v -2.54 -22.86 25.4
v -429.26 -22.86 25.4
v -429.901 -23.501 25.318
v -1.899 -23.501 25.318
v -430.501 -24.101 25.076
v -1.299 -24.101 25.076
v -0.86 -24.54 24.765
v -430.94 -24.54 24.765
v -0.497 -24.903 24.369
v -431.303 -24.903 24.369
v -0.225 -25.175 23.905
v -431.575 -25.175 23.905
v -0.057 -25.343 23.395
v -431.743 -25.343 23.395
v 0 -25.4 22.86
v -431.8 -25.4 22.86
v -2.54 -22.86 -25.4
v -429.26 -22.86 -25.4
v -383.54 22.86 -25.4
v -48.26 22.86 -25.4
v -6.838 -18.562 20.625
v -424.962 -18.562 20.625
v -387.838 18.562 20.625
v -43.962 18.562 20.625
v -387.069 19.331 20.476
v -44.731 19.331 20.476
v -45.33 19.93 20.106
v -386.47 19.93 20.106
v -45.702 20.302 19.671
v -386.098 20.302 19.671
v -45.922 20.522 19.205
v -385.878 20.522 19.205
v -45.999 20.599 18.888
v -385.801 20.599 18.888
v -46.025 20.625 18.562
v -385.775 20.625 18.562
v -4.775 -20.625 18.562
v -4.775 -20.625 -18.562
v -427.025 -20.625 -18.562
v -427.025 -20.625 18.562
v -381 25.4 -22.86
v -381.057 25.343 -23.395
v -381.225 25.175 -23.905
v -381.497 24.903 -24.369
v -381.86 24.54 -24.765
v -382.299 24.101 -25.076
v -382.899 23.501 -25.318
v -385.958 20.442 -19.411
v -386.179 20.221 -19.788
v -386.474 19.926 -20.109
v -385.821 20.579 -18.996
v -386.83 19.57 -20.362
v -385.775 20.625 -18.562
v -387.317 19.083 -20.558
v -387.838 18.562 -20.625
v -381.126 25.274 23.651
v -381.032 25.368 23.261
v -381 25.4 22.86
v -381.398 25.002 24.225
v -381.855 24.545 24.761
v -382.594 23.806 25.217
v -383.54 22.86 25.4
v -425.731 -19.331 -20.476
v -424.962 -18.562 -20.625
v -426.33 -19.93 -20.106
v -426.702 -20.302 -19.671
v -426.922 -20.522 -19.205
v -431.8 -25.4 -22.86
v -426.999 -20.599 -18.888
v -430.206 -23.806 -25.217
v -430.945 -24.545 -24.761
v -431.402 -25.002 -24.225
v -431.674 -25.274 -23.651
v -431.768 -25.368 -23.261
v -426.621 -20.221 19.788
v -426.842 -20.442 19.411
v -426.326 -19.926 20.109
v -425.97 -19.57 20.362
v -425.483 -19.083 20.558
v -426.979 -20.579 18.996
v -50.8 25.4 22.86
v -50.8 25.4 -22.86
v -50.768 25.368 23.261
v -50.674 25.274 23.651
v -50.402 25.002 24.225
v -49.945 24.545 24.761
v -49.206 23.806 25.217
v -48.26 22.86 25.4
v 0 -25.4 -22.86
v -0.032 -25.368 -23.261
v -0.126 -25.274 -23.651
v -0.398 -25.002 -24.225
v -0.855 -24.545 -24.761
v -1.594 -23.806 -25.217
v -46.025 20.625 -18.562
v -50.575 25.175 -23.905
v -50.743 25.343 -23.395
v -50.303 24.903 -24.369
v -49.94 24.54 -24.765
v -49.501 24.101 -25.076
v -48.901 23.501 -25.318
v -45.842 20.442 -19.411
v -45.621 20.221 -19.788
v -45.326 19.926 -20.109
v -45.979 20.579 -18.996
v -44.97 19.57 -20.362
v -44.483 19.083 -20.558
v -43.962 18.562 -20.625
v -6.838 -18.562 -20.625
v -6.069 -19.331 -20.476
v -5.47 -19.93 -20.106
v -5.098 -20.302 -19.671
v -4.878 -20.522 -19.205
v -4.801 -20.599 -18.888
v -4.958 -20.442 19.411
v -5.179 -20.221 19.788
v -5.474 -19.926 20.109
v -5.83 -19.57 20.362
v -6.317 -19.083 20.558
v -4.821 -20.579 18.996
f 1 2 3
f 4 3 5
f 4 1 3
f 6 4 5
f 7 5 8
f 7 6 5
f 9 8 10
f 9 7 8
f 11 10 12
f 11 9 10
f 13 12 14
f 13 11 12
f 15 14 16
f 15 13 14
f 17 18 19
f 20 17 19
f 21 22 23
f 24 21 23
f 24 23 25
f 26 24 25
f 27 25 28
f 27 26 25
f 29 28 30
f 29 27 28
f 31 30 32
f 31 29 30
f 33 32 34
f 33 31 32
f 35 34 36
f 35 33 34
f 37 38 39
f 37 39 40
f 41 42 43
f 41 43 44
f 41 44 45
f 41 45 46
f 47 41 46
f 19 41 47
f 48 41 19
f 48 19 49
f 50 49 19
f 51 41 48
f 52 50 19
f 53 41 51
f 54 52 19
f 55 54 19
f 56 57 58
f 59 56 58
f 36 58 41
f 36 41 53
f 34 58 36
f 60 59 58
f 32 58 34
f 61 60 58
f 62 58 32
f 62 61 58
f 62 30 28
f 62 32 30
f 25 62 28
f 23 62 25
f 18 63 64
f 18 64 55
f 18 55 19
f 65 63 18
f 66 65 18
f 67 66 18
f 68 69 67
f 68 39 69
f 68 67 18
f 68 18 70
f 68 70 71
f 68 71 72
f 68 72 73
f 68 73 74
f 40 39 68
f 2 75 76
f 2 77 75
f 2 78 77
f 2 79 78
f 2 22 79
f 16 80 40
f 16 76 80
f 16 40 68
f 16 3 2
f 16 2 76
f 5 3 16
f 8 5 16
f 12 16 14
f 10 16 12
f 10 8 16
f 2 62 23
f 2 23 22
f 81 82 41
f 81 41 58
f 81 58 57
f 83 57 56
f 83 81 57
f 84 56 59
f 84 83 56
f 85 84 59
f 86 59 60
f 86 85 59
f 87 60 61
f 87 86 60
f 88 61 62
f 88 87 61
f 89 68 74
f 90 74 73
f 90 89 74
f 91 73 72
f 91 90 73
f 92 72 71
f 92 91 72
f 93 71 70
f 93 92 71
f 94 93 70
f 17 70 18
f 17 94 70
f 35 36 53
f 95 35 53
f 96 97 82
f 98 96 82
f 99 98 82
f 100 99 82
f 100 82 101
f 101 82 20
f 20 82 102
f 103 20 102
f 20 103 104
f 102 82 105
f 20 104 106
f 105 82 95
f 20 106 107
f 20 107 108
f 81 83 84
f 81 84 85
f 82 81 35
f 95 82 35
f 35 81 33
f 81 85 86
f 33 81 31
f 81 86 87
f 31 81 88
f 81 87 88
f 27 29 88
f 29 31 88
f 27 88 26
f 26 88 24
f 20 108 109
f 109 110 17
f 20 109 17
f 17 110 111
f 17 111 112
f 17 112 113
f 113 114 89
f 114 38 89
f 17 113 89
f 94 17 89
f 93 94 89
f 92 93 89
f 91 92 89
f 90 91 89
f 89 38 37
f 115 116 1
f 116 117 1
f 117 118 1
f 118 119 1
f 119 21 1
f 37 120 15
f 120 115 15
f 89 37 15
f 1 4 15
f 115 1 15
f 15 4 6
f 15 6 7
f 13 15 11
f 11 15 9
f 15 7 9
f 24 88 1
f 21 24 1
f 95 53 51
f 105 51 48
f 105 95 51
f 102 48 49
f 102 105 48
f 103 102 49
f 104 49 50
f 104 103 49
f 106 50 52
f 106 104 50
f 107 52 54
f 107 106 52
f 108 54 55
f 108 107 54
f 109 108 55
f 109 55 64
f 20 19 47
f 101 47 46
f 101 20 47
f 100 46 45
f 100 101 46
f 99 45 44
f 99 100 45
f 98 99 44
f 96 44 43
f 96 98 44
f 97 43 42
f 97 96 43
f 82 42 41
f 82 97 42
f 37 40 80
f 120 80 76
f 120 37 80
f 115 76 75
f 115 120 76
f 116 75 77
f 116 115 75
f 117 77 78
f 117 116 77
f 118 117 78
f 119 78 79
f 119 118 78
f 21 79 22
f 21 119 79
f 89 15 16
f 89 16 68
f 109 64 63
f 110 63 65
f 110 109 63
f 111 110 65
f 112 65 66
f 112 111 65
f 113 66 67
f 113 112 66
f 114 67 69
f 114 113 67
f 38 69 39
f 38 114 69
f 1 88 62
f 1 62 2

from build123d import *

# Parameters (mm, degrees)
SQUARE_TUBE_2X2X188_A500_1_DEPTH = 431.8
CUT_EXTRUDE1_DEPTH               = 436.519276267


with BuildPart() as part:
    # Sketch12 → Square tube 2X2X188 A500(1) (new body)
    with BuildSketch(Plane(origin=(0, 0, 0), x_dir=(0, -1, 0), z_dir=(-1, 0, 0))):
        with BuildLine():
            Line((22.86, -25.4), (-22.86, -25.4))
            ThreePointArc((-22.86, -25.4), (-24.656051224, -24.656051224), (-25.4, -22.86))
            Line((-25.4, -22.86), (-25.4, 22.86))
            ThreePointArc((-25.4, 22.86), (-24.656051224, 24.656051224), (-22.86, 25.4))
            Line((-22.86, 25.4), (22.86, 25.4))
            ThreePointArc((22.86, 25.4), (24.656051224, 24.656051224), (25.4, 22.86))
            Line((25.4, 22.86), (25.4, -22.86))
            ThreePointArc((25.4, -22.86), (24.656051224, -24.656051224), (22.86, -25.4))
        make_face()
        with BuildLine():
            Line((18.56232, 20.6248), (-18.56232, 20.6248))
            ThreePointArc((-18.56232, 20.6248), (-20.020713594, 20.020713594), (-20.6248, 18.56232))
            Line((-20.6248, 18.56232), (-20.6248, -18.56232))
            ThreePointArc((-20.6248, -18.56232), (-20.020713594, -20.020713594), (-18.56232, -20.6248))
            Line((-18.56232, -20.6248), (18.56232, -20.6248))
            ThreePointArc((18.56232, -20.6248), (20.020713594, -20.020713594), (20.6248, -18.56232))
            Line((20.6248, -18.56232), (20.6248, 18.56232))
            ThreePointArc((20.6248, 18.56232), (20.020713594, 20.020713594), (18.56232, 20.6248))
        make_face(mode=Mode.SUBTRACT)
    extrude(amount=SQUARE_TUBE_2X2X188_A500_1_DEPTH)

    # Sketch14 → Cut-Extrude1 (cut, through all)
    with BuildSketch(Plane.XY.offset(25.4)):
        Polygon((-431.8, -25.4), (-431.8, 25.4), (-381, 25.4), align=None)
        Polygon((0, -25.4), (0, 25.4), (-50.8, 25.4), align=None)
    extrude(amount=-CUT_EXTRUDE1_DEPTH, mode=Mode.SUBTRACT)


solid = part.part
